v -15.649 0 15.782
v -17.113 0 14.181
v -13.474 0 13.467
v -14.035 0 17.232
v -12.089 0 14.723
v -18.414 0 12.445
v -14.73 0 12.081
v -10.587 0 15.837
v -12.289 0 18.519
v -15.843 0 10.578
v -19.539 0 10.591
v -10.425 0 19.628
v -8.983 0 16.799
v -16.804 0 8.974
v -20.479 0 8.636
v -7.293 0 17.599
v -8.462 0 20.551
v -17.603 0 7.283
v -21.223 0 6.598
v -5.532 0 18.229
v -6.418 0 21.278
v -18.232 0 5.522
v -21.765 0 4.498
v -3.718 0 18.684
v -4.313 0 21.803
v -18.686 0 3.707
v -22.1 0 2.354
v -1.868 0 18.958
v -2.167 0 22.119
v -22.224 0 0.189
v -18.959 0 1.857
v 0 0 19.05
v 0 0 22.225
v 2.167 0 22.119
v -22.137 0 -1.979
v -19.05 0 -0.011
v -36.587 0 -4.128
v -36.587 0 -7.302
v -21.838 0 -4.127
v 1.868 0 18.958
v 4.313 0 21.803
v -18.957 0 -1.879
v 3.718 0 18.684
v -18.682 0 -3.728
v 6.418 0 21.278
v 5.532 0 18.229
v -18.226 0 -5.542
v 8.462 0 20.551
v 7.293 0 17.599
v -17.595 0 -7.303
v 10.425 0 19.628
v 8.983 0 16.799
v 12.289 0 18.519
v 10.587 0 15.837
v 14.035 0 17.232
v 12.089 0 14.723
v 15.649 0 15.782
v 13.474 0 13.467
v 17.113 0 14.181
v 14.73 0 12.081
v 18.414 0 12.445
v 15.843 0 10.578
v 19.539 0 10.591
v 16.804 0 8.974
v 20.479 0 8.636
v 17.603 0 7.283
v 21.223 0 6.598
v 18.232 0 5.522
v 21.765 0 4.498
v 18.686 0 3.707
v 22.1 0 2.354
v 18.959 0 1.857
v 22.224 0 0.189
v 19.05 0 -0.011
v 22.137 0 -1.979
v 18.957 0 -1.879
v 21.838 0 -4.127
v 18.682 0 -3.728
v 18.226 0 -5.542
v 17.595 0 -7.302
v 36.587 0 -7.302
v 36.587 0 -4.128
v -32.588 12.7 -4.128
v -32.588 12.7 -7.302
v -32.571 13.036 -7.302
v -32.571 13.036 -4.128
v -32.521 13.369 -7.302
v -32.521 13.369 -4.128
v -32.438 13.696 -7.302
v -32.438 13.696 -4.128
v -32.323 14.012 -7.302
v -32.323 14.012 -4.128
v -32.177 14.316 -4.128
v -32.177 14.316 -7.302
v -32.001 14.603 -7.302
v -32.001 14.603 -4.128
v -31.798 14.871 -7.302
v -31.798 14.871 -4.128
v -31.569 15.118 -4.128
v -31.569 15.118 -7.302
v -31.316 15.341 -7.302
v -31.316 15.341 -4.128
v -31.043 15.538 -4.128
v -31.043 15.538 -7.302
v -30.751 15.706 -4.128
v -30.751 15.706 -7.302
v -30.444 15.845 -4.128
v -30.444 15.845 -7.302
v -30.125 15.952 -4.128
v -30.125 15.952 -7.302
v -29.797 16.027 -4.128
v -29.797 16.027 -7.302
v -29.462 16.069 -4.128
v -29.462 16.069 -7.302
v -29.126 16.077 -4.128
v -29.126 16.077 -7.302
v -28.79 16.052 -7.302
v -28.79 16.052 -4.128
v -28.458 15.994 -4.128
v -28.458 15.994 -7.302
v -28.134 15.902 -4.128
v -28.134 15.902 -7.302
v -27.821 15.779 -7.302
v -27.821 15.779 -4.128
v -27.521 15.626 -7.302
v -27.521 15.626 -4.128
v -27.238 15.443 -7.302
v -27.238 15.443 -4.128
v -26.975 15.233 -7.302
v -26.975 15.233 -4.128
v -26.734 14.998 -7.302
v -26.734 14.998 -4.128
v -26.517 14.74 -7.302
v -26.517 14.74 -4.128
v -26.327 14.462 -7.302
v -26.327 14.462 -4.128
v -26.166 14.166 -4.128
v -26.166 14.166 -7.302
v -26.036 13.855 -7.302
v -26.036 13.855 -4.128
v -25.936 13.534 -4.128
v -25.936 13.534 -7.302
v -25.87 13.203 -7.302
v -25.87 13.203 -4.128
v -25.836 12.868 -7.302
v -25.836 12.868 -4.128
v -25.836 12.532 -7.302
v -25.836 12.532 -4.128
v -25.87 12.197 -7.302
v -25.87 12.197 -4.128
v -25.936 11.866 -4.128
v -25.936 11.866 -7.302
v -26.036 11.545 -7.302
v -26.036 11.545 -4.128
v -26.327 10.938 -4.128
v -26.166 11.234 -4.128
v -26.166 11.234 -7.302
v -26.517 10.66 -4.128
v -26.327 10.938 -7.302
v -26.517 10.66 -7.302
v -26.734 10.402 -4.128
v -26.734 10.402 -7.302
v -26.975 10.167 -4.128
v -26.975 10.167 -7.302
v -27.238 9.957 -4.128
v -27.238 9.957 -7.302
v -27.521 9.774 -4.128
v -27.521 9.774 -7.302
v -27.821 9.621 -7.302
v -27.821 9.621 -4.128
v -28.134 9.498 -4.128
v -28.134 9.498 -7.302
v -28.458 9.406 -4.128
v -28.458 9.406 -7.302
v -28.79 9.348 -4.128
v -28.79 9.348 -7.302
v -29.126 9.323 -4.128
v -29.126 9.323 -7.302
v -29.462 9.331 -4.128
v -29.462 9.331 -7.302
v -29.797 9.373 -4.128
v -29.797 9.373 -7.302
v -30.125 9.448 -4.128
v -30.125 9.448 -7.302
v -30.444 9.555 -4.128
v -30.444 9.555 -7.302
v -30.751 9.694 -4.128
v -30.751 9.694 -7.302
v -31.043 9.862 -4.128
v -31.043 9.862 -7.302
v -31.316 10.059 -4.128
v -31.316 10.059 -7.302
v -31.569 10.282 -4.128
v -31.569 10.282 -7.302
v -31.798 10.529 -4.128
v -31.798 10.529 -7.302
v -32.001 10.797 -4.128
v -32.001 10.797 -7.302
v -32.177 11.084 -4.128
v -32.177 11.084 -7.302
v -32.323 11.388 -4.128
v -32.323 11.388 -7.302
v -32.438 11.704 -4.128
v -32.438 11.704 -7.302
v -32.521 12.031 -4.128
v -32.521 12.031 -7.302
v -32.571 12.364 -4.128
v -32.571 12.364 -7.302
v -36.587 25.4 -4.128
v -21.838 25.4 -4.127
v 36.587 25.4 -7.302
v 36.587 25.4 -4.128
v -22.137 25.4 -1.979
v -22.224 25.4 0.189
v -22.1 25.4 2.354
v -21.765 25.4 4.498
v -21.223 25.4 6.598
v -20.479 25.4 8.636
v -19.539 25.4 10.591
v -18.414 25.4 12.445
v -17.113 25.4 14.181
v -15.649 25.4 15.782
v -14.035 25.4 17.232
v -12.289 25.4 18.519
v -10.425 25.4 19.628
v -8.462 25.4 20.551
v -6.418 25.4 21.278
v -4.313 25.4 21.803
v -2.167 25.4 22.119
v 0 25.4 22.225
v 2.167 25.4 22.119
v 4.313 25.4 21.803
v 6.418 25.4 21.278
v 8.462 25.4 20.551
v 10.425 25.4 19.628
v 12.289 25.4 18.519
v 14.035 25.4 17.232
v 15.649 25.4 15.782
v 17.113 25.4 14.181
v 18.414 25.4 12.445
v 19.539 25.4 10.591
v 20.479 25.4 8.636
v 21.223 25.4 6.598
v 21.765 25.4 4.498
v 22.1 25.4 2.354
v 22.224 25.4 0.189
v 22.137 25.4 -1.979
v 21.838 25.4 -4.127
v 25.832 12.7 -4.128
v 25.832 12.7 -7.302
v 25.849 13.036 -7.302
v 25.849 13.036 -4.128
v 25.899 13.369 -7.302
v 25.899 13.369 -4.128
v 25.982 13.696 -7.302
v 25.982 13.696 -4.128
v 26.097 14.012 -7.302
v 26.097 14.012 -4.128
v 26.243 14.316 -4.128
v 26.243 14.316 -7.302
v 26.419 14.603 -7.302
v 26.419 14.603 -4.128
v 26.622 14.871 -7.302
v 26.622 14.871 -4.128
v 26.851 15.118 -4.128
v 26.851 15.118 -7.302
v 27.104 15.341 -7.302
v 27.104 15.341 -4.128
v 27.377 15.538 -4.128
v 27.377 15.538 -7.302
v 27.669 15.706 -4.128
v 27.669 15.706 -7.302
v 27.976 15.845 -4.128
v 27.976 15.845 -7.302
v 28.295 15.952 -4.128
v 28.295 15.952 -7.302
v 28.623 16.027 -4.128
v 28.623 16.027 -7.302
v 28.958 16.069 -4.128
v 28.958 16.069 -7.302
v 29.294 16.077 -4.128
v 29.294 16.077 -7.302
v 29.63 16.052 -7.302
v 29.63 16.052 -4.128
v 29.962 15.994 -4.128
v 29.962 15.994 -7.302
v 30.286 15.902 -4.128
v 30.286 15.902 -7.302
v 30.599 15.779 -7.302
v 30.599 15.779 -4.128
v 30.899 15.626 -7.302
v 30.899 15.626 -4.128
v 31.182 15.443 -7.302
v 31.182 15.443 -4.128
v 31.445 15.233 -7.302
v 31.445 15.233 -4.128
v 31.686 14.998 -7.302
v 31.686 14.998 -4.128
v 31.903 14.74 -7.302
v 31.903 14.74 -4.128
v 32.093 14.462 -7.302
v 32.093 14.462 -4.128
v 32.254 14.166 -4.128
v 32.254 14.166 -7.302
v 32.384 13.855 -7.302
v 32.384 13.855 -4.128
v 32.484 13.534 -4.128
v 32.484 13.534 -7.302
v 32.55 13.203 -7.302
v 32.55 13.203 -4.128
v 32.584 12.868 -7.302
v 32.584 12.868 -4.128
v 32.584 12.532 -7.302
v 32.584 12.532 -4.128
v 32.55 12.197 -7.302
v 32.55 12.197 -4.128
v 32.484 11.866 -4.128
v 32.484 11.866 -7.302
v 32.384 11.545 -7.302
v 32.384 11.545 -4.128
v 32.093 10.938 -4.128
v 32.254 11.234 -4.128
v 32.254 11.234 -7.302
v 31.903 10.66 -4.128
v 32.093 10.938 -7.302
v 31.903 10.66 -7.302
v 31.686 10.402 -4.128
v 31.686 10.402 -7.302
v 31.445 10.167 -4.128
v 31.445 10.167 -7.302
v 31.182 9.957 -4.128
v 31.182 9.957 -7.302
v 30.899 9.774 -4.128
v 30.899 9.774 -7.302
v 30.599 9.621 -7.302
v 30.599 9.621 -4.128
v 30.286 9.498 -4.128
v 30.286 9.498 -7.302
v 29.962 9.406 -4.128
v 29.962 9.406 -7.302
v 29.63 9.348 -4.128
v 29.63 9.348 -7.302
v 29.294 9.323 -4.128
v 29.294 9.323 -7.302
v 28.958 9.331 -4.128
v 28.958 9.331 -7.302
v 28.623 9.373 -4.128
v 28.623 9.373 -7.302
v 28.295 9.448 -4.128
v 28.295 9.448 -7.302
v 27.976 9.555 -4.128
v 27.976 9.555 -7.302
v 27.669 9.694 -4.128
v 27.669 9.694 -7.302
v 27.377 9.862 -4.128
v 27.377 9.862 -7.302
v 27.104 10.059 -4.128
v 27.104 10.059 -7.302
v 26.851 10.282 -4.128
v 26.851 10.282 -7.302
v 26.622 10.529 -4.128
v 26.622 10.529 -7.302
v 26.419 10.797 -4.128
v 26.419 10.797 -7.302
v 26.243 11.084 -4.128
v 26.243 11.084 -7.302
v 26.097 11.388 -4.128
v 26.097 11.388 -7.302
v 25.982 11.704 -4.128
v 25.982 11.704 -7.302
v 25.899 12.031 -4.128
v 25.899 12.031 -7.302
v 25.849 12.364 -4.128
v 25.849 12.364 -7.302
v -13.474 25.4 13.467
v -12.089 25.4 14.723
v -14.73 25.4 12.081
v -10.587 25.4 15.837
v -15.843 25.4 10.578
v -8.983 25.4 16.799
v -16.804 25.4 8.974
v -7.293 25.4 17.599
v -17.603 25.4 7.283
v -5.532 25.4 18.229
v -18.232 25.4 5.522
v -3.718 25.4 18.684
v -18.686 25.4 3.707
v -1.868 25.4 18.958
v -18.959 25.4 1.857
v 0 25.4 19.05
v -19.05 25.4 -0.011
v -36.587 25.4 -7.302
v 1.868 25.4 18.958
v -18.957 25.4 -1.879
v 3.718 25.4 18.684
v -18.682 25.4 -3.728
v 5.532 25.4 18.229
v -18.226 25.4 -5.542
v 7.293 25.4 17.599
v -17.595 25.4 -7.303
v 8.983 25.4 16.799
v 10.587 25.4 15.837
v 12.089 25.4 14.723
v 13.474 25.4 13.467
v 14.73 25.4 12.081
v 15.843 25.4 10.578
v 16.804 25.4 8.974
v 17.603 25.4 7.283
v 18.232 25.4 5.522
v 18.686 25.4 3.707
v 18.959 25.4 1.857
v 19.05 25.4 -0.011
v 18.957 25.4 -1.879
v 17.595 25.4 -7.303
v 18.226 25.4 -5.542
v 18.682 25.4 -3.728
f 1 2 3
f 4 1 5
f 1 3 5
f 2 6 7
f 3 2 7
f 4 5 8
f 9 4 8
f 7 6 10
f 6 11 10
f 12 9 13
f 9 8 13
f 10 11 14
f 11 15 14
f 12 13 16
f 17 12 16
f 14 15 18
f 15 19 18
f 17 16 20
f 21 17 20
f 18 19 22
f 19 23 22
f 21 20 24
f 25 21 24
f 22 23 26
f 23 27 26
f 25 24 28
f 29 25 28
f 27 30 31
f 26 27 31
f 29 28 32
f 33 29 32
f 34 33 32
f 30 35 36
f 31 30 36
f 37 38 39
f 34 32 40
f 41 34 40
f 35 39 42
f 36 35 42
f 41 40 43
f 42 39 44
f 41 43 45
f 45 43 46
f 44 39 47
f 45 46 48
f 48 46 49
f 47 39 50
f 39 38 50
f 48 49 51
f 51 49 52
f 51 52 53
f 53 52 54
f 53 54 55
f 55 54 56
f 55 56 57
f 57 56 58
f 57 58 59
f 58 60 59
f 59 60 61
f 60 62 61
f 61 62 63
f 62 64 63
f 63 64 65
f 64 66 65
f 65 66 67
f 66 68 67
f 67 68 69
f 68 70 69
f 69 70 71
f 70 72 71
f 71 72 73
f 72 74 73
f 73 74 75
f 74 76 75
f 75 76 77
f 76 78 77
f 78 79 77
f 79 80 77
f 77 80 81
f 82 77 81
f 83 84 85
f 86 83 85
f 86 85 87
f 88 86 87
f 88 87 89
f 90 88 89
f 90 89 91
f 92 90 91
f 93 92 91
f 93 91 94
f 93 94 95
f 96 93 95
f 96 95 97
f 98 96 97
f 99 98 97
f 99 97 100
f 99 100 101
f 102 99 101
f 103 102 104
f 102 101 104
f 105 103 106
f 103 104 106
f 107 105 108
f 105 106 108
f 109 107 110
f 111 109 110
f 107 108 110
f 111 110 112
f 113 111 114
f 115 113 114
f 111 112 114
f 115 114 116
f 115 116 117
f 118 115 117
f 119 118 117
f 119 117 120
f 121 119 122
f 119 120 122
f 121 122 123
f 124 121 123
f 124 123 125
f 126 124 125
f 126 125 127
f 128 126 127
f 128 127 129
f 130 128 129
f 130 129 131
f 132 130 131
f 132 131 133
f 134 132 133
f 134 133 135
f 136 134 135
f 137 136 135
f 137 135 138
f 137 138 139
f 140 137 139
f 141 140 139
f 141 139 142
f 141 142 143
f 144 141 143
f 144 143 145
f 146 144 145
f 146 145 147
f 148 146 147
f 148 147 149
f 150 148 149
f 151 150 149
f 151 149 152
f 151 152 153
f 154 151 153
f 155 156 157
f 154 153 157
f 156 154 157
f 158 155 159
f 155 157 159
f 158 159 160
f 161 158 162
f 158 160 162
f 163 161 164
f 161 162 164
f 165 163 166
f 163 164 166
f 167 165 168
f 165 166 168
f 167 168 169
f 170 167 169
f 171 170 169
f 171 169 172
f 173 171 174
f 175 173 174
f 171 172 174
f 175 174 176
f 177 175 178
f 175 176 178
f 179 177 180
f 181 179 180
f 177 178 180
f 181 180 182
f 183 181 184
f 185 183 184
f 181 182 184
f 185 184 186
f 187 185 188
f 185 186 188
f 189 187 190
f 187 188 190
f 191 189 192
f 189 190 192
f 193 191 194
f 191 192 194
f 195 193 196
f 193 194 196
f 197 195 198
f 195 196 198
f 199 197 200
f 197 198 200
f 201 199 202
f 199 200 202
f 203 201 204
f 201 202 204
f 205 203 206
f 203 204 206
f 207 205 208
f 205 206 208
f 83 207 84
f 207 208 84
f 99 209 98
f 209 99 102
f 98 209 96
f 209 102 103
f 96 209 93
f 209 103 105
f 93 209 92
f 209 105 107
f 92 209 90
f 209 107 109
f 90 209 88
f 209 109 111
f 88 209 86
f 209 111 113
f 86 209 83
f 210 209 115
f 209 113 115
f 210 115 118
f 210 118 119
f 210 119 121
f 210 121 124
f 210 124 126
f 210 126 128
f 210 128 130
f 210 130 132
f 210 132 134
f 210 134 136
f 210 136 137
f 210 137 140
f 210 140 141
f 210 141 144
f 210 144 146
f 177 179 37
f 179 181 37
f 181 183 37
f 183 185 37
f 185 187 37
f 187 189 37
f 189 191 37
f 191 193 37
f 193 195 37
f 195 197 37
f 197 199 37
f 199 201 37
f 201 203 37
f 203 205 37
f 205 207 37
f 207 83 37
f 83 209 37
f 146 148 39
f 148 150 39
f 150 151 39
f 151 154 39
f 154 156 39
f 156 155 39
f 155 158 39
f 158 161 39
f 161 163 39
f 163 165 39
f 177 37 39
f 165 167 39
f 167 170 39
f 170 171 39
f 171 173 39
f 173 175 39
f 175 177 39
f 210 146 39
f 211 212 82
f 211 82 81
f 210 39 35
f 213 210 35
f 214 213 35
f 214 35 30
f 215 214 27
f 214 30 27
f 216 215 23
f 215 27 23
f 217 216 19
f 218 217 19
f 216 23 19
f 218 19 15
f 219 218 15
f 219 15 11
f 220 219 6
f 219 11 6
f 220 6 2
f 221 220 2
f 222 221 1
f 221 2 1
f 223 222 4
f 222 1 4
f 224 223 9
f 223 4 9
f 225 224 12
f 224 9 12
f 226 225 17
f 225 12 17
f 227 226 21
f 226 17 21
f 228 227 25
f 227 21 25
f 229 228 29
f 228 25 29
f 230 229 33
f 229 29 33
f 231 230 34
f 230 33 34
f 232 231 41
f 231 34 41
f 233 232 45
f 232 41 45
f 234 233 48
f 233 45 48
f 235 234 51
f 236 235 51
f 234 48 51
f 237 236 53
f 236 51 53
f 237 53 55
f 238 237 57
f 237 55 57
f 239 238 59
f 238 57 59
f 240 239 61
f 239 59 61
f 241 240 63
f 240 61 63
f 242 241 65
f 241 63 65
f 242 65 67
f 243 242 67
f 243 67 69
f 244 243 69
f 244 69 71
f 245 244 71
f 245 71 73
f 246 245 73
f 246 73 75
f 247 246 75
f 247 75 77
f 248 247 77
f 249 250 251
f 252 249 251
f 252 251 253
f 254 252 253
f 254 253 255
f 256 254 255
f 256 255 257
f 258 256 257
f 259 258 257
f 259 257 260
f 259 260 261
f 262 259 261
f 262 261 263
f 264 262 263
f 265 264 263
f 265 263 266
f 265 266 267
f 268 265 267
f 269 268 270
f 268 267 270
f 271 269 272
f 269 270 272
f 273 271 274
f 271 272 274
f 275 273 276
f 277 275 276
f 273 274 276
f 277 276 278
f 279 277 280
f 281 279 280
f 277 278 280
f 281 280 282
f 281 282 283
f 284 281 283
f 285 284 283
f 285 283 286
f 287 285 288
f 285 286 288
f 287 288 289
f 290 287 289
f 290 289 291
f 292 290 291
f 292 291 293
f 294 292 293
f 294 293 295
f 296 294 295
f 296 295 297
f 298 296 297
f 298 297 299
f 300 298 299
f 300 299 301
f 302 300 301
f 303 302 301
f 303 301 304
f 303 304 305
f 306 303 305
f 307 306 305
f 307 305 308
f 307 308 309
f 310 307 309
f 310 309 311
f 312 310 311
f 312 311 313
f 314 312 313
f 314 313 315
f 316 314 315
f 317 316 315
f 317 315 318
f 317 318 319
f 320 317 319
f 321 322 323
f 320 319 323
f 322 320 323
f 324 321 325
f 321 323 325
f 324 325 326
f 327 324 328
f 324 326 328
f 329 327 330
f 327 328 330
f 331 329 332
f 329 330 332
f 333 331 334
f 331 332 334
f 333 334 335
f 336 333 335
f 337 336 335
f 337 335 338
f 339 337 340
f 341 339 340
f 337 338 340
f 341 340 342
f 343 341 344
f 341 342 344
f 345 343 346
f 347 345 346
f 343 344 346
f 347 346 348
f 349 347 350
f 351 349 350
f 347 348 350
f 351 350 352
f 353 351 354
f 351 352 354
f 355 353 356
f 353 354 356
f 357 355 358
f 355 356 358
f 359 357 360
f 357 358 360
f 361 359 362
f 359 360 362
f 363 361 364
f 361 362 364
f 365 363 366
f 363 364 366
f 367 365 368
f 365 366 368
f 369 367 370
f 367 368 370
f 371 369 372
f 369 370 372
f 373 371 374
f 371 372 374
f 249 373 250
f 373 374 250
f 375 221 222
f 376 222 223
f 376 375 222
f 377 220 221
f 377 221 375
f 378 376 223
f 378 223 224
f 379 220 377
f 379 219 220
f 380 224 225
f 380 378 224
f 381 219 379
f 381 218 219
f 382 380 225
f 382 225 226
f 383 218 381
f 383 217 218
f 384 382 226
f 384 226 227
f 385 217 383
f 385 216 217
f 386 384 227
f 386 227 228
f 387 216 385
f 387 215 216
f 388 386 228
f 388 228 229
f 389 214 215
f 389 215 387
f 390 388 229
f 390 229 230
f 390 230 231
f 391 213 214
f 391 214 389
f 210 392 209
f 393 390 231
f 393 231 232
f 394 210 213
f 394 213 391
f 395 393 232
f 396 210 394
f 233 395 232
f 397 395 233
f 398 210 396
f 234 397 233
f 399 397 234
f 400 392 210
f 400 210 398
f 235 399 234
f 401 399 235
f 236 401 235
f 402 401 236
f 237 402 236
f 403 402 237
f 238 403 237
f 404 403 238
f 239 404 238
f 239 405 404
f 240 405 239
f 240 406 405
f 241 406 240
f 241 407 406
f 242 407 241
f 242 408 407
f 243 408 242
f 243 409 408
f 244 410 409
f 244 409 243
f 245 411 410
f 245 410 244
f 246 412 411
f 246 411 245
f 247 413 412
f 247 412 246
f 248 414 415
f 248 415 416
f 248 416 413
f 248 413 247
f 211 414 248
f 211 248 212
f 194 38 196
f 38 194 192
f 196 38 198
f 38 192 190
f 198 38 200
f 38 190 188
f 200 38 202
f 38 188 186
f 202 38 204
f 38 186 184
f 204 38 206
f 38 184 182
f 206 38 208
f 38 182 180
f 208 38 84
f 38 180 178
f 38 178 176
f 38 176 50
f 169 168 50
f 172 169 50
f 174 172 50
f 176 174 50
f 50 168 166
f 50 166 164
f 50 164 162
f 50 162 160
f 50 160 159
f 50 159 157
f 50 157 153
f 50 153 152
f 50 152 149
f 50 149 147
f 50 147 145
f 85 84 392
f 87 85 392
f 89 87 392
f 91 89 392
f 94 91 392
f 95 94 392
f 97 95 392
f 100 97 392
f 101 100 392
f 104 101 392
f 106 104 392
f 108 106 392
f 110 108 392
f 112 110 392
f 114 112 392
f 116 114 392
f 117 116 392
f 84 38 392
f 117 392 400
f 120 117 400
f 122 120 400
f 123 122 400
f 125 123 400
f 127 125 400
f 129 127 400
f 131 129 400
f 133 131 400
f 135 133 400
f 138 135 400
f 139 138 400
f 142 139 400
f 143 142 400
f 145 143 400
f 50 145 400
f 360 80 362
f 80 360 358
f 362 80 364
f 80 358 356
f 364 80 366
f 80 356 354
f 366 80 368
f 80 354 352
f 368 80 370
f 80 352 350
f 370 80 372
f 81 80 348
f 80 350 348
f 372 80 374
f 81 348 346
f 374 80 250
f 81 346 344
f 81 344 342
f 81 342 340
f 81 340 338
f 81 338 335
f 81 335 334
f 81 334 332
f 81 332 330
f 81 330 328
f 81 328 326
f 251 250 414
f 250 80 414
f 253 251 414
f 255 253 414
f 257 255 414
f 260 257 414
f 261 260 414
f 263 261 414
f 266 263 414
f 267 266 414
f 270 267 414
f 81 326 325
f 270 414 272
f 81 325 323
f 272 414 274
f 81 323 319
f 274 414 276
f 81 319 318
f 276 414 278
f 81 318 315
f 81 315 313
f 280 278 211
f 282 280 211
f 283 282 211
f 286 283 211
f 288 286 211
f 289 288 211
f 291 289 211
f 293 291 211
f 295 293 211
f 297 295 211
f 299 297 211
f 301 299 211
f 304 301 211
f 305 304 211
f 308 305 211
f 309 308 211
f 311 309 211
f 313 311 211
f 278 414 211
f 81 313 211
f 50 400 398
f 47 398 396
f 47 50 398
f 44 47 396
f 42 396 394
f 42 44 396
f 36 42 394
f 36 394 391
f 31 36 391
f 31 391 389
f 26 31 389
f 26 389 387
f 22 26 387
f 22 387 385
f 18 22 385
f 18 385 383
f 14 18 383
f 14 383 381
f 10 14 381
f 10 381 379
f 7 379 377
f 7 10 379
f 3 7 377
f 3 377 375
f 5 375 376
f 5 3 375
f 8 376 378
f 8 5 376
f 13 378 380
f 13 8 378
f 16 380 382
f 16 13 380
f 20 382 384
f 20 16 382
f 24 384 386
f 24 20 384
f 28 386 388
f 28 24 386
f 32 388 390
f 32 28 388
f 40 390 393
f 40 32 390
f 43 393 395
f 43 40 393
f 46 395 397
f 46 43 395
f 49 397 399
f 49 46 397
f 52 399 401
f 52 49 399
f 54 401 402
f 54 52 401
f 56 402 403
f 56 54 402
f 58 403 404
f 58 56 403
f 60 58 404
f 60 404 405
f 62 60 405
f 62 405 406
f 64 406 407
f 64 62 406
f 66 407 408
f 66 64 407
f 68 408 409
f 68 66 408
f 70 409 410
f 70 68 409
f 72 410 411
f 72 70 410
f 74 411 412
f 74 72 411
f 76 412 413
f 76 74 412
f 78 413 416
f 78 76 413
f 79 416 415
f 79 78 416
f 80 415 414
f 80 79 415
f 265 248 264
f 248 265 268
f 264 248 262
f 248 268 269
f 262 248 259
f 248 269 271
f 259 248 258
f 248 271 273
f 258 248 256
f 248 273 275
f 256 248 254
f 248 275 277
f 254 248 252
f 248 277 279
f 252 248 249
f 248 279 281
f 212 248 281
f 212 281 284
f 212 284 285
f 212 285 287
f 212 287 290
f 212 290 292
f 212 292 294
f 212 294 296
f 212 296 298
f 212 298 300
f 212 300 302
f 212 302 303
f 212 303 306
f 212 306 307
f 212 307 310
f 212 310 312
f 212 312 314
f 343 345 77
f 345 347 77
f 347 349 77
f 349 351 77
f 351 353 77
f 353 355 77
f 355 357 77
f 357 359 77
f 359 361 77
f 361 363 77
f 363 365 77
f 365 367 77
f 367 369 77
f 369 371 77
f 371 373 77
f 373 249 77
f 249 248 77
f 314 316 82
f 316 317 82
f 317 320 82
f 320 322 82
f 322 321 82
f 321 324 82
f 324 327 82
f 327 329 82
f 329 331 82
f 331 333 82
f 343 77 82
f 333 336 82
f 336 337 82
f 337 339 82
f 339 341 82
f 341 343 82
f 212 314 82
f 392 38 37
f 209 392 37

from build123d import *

# Parameters (mm, degrees)
SKETCH1_R           = 19.05
BOSS_EXTRUDE1_DEPTH = 25.4
SKETCH2_R           = 3.3782
CUT_EXTRUDE1_DEPTH  = 36.8775
SKETCH3_W           = 84.126846883
SKETCH3_H           = 24.140829336
CUT_EXTRUDE2_DEPTH  = 26.4


with BuildPart() as part:
    # Sketch1 → Boss-Extrude1 (new body)
    with BuildSketch(Plane(origin=(0, 0, 0), x_dir=(1, 0, 0), z_dir=(0, 1, 0))):
        with BuildLine():
            Line((36.587384889, 13.6525), (17.537384889, 13.6525))
            ThreePointArc((17.537384889, 13.6525), (0, 22.225), (-17.537384889, 13.6525))
            Line((-17.537384889, 13.6525), (-36.587384889, 13.6525))
            Line((-36.587384889, 13.6525), (-36.587384889, 4.1275))
            Line((-36.587384889, 4.1275), (-21.838369187, 4.1275))
            ThreePointArc((-21.838369187, 4.1275), (0, -22.225), (21.838369187, 4.1275))
            Line((21.838369187, 4.1275), (36.587384889, 4.1275))
            Line((36.587384889, 4.1275), (36.587384889, 13.6525))
        make_face()
        Circle(SKETCH1_R, mode=Mode.SUBTRACT)
    extrude(amount=BOSS_EXTRUDE1_DEPTH)

    # Sketch2 → Cut-Extrude1 (cut, through all)
    with BuildSketch(Plane(origin=(0, 0, -13.6525), x_dir=(-1, 0, 0), z_dir=(0, 0, -1))):
        with Locations((29.21, 12.7)):
            Circle(SKETCH2_R)
        with Locations((-29.21, 12.7)):
            Circle(SKETCH2_R)
    extrude(amount=-CUT_EXTRUDE1_DEPTH, mode=Mode.SUBTRACT)

    # Sketch3 → Cut-Extrude2 (cut, through all)
    with BuildSketch(Plane(origin=(0, 25.4, 0), x_dir=(1, 0, 0), z_dir=(0, 1, 0))):
        with Locations((0.41143502, 19.372914668)):
            Rectangle(SKETCH3_W, SKETCH3_H)
    extrude(amount=-CUT_EXTRUDE2_DEPTH, mode=Mode.SUBTRACT)


solid = part.part
